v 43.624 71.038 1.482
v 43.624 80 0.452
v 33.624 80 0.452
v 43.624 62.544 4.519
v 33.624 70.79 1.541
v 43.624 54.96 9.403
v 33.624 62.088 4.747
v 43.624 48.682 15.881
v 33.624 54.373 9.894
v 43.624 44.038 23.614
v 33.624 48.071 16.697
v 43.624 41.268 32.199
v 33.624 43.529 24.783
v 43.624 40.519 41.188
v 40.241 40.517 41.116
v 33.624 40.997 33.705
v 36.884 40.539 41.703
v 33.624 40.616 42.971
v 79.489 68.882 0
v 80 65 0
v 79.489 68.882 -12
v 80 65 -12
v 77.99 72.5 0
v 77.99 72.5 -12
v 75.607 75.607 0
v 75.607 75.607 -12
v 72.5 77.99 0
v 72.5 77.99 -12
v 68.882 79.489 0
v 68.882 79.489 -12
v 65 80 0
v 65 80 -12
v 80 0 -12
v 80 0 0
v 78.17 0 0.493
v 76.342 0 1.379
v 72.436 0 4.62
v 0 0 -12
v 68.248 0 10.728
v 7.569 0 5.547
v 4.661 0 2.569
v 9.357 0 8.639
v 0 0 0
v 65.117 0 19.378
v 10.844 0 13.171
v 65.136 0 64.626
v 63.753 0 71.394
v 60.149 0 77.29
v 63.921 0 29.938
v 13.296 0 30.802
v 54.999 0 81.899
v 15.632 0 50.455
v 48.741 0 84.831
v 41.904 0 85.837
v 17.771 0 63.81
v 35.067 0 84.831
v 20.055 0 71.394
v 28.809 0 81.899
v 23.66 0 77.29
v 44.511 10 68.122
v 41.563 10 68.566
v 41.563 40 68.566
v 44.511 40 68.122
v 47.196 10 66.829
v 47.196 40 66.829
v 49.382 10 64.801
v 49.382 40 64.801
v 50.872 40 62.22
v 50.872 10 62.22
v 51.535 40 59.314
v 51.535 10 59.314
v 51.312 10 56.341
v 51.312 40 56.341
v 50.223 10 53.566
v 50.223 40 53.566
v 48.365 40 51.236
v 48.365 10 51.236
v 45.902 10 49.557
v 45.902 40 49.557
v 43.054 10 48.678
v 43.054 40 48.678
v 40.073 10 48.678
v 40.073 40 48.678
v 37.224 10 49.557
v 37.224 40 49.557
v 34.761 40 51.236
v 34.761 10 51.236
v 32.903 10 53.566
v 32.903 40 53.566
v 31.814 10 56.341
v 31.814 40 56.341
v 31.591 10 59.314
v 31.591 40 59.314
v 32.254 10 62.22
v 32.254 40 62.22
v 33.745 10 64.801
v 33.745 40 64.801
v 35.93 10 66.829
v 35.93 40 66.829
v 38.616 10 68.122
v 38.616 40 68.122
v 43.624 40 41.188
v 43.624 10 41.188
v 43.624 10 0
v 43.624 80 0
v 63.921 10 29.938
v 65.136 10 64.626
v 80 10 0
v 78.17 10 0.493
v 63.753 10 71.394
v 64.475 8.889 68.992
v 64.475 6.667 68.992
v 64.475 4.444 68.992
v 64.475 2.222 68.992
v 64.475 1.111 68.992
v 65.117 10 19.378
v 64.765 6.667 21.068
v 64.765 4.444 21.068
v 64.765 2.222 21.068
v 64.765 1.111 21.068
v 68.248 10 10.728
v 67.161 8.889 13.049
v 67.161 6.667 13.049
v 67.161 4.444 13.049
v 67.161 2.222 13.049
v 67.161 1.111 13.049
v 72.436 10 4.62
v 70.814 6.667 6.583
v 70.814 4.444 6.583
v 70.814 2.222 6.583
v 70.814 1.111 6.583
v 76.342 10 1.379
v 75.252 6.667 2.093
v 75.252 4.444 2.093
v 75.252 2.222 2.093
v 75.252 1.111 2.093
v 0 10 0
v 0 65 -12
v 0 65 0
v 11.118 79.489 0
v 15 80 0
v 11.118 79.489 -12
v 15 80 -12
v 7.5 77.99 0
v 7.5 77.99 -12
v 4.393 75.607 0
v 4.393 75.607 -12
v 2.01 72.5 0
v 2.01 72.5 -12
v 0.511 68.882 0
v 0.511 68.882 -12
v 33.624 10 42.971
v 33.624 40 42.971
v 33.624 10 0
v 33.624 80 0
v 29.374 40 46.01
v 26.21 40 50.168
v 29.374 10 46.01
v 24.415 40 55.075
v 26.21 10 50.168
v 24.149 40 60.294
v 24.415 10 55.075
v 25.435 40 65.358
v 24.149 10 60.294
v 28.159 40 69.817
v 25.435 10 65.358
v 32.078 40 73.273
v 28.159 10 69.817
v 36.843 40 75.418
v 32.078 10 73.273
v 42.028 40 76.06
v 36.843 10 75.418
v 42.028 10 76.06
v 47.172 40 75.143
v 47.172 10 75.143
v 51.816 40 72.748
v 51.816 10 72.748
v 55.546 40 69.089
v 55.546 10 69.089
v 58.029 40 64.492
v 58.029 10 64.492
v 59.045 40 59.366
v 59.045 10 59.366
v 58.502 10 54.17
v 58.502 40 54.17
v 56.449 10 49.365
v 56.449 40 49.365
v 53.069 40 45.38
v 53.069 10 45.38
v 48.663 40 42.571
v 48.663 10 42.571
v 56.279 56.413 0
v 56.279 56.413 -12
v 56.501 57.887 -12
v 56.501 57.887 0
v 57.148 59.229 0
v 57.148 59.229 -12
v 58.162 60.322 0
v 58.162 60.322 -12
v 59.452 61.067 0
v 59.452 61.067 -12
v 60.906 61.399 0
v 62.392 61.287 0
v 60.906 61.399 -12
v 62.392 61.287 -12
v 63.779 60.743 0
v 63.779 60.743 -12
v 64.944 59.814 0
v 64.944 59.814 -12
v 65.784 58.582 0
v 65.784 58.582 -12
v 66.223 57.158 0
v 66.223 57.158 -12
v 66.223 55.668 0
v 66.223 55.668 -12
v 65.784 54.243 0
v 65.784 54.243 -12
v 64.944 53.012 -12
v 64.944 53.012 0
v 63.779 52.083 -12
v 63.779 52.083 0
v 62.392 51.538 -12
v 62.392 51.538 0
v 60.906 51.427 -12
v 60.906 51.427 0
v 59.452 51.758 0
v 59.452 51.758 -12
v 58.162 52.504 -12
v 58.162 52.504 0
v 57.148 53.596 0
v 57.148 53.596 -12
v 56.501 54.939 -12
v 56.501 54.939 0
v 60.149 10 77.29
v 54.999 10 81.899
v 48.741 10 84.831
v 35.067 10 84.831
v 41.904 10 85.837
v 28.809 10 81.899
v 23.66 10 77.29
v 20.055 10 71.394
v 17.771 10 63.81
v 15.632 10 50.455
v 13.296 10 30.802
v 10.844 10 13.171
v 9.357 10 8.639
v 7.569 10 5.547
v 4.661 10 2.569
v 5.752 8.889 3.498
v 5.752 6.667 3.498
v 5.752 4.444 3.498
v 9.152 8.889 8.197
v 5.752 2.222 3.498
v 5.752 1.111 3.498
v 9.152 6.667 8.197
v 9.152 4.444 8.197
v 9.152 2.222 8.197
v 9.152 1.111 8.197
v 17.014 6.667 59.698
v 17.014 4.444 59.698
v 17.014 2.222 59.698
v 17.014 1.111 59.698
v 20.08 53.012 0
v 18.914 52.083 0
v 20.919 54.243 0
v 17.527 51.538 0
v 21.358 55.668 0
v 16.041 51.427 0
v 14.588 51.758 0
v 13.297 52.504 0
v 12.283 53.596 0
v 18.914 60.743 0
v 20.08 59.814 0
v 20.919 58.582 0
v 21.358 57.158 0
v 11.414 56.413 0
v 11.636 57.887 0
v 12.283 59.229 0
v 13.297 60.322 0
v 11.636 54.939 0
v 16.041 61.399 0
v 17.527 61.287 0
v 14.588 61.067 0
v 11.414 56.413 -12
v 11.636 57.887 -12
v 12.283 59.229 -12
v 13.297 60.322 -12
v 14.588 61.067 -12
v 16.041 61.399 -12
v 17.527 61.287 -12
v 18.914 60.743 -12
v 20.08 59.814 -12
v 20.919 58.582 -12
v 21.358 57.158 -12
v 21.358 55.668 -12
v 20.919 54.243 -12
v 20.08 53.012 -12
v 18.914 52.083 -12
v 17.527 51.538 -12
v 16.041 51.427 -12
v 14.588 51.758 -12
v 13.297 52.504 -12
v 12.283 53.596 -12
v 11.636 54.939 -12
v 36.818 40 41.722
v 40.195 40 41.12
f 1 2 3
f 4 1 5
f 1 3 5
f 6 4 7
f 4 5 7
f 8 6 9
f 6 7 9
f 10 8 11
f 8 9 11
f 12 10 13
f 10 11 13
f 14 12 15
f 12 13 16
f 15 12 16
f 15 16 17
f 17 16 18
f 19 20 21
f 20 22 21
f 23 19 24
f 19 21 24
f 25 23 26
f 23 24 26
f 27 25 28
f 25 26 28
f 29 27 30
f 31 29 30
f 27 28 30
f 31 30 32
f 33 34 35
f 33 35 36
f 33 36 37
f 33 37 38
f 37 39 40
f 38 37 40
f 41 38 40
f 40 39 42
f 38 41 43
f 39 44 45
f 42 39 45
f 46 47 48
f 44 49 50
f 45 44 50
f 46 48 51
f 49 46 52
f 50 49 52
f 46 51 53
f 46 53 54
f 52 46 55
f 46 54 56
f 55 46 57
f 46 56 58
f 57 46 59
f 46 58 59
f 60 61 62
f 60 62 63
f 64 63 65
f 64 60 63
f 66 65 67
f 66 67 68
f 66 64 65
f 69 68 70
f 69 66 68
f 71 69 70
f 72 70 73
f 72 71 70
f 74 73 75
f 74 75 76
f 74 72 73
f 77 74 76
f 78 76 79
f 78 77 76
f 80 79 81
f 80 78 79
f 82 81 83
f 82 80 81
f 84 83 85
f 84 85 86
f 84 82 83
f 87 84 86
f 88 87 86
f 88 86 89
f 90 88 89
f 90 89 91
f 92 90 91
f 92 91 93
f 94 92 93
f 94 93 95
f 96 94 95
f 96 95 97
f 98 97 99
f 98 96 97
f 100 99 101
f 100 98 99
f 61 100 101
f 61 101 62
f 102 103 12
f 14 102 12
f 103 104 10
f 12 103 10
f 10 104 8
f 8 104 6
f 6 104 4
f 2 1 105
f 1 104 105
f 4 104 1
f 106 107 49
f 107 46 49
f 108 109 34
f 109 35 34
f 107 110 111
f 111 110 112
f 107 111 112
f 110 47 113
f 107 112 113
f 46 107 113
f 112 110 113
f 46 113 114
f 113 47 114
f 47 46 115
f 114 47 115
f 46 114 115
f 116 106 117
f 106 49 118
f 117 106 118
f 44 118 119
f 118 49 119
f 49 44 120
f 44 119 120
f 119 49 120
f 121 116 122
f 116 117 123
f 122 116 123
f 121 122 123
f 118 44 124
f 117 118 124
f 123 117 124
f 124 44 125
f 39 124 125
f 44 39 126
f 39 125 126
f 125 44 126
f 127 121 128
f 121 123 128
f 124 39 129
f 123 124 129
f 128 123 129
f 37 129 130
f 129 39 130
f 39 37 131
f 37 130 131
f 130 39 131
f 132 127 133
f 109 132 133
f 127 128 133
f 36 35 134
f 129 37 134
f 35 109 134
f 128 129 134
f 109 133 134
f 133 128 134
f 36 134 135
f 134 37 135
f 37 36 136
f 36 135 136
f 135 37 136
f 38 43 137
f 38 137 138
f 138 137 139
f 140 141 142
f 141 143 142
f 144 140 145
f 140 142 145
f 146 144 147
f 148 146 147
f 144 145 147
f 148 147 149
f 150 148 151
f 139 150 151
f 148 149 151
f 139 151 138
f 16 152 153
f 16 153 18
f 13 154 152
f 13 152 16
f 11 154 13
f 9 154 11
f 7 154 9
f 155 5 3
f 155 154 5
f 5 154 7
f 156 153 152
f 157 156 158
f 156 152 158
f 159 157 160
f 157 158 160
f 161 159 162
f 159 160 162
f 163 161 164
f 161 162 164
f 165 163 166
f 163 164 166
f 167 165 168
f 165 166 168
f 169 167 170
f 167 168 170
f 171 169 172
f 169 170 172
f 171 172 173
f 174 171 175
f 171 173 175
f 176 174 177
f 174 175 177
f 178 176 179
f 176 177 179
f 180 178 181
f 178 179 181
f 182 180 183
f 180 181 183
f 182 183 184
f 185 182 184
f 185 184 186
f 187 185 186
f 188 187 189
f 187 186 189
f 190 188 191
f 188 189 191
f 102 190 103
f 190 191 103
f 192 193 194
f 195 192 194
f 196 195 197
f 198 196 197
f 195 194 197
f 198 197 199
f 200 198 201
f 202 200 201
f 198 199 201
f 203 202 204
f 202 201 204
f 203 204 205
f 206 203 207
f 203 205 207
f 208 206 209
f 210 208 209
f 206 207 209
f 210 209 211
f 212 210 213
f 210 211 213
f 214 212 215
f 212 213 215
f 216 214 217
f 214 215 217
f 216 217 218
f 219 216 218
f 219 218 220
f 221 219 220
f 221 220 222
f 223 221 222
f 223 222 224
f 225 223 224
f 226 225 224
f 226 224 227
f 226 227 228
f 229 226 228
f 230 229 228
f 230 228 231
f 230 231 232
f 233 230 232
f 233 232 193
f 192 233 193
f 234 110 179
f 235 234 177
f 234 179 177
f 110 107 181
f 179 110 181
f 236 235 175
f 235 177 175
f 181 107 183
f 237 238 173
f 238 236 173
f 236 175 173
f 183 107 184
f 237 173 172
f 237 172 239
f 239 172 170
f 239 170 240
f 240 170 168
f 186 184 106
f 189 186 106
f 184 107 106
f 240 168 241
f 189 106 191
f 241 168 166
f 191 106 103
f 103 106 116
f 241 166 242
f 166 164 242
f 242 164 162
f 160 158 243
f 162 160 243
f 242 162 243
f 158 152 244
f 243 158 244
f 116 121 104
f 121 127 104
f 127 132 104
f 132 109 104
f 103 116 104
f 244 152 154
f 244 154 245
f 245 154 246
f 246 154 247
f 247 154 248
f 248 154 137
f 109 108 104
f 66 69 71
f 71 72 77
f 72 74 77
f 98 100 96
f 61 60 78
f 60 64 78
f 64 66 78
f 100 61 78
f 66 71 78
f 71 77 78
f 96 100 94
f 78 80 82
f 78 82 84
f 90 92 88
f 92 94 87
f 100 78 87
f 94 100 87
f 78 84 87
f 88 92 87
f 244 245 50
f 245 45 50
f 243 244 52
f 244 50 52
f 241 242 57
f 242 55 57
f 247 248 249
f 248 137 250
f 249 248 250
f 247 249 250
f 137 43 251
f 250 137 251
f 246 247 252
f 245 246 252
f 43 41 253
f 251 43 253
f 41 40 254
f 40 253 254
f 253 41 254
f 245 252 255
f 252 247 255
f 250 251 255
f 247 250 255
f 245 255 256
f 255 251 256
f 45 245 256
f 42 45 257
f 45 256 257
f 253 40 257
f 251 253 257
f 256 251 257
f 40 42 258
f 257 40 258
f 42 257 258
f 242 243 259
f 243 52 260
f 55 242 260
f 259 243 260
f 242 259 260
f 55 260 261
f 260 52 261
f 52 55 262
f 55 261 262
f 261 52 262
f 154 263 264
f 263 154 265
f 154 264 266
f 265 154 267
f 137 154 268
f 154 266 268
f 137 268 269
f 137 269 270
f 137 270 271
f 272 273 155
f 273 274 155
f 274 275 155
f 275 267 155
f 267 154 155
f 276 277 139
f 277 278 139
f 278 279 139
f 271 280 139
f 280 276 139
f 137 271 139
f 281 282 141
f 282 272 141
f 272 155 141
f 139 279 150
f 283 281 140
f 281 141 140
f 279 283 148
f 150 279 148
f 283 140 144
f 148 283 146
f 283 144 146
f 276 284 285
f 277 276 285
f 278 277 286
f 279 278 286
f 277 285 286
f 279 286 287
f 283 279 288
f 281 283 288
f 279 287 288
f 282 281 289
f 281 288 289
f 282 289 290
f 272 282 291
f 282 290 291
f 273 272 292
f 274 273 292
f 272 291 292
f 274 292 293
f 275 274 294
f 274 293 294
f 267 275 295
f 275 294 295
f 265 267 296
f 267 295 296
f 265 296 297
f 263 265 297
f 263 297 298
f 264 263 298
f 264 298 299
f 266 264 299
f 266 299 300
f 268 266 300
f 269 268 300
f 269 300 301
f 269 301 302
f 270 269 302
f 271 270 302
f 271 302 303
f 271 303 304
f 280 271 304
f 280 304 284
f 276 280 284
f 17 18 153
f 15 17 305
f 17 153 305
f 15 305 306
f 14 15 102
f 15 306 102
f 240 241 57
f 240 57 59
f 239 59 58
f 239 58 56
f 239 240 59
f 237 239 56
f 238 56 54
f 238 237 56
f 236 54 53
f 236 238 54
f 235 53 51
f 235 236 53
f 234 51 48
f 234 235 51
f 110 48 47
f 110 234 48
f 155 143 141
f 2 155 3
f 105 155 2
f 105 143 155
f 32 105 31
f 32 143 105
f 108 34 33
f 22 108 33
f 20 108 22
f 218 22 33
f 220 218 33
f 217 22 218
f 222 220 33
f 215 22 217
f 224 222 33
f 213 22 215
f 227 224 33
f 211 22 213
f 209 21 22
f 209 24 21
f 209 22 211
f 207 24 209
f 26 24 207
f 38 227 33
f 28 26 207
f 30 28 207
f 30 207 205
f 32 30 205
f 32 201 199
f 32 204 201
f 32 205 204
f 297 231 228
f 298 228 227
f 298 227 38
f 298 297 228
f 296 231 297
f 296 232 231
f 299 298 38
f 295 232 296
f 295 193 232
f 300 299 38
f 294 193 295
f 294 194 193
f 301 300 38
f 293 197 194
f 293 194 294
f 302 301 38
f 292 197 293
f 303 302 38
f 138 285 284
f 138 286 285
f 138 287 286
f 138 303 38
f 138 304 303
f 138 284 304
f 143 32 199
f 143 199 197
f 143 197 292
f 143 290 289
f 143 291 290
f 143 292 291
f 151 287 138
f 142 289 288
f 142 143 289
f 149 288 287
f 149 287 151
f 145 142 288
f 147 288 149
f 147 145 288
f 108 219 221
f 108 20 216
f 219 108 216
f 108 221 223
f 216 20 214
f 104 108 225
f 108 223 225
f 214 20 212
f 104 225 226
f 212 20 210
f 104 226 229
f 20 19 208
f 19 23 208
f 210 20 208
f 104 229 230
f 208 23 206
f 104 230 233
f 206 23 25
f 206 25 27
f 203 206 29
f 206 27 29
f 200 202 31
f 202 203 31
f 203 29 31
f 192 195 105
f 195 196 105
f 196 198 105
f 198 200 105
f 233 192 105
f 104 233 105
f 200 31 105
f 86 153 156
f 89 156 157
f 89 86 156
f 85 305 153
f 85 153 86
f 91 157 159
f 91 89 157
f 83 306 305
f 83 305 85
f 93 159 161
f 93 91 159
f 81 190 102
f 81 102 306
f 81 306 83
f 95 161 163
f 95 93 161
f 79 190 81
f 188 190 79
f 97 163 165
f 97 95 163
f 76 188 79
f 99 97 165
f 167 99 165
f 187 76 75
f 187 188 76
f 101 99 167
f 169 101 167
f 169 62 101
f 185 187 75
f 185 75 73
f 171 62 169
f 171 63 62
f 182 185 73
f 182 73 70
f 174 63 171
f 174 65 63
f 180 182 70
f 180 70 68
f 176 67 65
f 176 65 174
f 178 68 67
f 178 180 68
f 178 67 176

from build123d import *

# Parameters (mm, degrees)
BOSS_EXTRUDE2_DEPTH      = 10
CUT_EXTRUDE_THIN1_DEPTH  = 10
SKETCH5_R                = 17.5
SKETCH5_R_2              = 10
BOSS_EXTRUDE3_DEPTH      = 30
SKETCH7_W                = 80
SKETCH7_H                = 80
BOSS_EXTRUDE4_DEPTH      = 12
FILLET2_R                = 15
BOSS_EXTRUDE5_REACH      = 144.014
BOSS_EXTRUDE5_END_RADIUS = 17.5
SKETCH8_W                = 10
SKETCH8_H                = 70
SKETCH9_R                = 39.5
CUT_EXTRUDE1_DEPTH       = 12
F_10_0MM_DOWEL_SLOT1_D   = 10


with BuildPart() as part:
    # Sketch3 → Boss-Extrude2 (new body)
    with BuildSketch(Plane(origin=(0, 0, 0), x_dir=(1, 0, 0), z_dir=(0, 1, 0))):
        with BuildLine():
            Line((0, 0), (80, 0))
            add(Edge.make_bspline(
                [(0, 0), (9.568772754, -3.662252769), (13.233792617, -26.367514399), (14.892974138, -48.26173719), (19.457625693, -73.382546531), (29.234028115, -88.842620539), (47.339429681, -94.978505807), (65.072681899, -76.355870434), (65.472290622, -49.499797191), (60.330152399, -17.820535728), (73.673313223, -1.004614773), (80, 0)],
                knots=[0, 0, 0, 0, 0.130431735, 0.366934607, 0.413509275, 0.549603742, 0.580090258, 0.687887922, 0.718701469, 0.85741218, 1, 1, 1, 1], degree=3))
        make_face()
    extrude(amount=BOSS_EXTRUDE2_DEPTH)

    # Sketch4 → Cut-Extrude-Thin1 (cut)
    with BuildSketch(Plane(origin=(0, 10, 0), x_dir=(1, 0, 0), z_dir=(0, 1, 0))):
        Polygon((7.236393203, -67.338737313), (6.633563606, -66.218935394), (15.43873628, -61.47879466), (16.041565876, -62.598596579), align=None)
        with BuildLine():
            ThreePointArc((20.05548635, -71.393733338), (41.904058586, -85.836536546), (63.752630822, -71.393733338))
            Line((63.752630822, -71.393733338), (72.953082149, -75.311857301))
            ThreePointArc((72.953082149, -75.311857301), (41.904058586, -95.836536546), (10.855035023, -75.311857301))
            Line((10.855035023, -75.311857301), (20.05548635, -71.393733338))
        make_face()
    extrude(amount=-CUT_EXTRUDE_THIN1_DEPTH, mode=Mode.SUBTRACT)

    # Sketch5 → Boss-Extrude3 (add)
    with BuildSketch(Plane(origin=(0, 10, 0), x_dir=(1, 0, 0), z_dir=(0, 1, 0))):
        with Locations(Location((41.563187494, -58.566374958, 0), (0, 0, 270))):
            Circle(SKETCH5_R)
        with Locations(Location((41.563187494, -58.566374958, 0), (0, 0, 270))):
            Circle(SKETCH5_R_2, mode=Mode.SUBTRACT)
    extrude(amount=BOSS_EXTRUDE3_DEPTH)

    # Sketch7 → Boss-Extrude4 (add)
    with BuildSketch(Plane(origin=(0, 0, 0), x_dir=(-1, 0, 0), z_dir=(0, 0, -1))):
        with Locations((-40, 40)):
            Rectangle(SKETCH7_W, SKETCH7_H)
    extrude(amount=BOSS_EXTRUDE4_DEPTH)

    # Fillet2
    fillet2_edges = [part.edges().sort_by_distance(p)[0] for p in [
        (80, 80, -6),
        (0, 80, -6),
    ]]
    fillet(fillet2_edges, radius=FILLET2_R)

    # Boss-Extrude5: up to this cylinder (the profile starts outside it)
    boss_extrude5_end = Plane(origin=(41.563187494, 45, 58.566374958), z_dir=(0, -1, 0)) * Cylinder(BOSS_EXTRUDE5_END_RADIUS, 324.028, mode=Mode.PRIVATE)
    # Sketch8 → Boss-Extrude5 (add, up to the surface)
    with BuildSketch(Plane.XY, mode=Mode.PRIVATE) as boss_extrude5_sk1:
        with Locations((38.624100389, 45)):
            Rectangle(SKETCH8_W, SKETCH8_H)
    boss_extrude5_tool1 = extrude(boss_extrude5_sk1.sketch, amount=BOSS_EXTRUDE5_REACH, mode=Mode.PRIVATE) - boss_extrude5_end
    add(boss_extrude5_tool1.solids().sort_by_distance((38.6241, 45, 0))[0])

    # Sketch9 → Cut-Extrude1 (cut)
    with BuildSketch(Plane.ZY.offset(-33.624100389)):
        with Locations((39.952210093, 80)):
            Circle(SKETCH9_R)
    extrude(amount=-CUT_EXTRUDE1_DEPTH, mode=Mode.SUBTRACT)

    # Ø10.0mm Dowel Slot1 (through all)
    with Locations(Plane.XY):
        with Locations((61.279203802, 56.41280999), (16.414291642, 56.41280999)):
            Hole(F_10_0MM_DOWEL_SLOT1_D / 2)


solid = part.part
